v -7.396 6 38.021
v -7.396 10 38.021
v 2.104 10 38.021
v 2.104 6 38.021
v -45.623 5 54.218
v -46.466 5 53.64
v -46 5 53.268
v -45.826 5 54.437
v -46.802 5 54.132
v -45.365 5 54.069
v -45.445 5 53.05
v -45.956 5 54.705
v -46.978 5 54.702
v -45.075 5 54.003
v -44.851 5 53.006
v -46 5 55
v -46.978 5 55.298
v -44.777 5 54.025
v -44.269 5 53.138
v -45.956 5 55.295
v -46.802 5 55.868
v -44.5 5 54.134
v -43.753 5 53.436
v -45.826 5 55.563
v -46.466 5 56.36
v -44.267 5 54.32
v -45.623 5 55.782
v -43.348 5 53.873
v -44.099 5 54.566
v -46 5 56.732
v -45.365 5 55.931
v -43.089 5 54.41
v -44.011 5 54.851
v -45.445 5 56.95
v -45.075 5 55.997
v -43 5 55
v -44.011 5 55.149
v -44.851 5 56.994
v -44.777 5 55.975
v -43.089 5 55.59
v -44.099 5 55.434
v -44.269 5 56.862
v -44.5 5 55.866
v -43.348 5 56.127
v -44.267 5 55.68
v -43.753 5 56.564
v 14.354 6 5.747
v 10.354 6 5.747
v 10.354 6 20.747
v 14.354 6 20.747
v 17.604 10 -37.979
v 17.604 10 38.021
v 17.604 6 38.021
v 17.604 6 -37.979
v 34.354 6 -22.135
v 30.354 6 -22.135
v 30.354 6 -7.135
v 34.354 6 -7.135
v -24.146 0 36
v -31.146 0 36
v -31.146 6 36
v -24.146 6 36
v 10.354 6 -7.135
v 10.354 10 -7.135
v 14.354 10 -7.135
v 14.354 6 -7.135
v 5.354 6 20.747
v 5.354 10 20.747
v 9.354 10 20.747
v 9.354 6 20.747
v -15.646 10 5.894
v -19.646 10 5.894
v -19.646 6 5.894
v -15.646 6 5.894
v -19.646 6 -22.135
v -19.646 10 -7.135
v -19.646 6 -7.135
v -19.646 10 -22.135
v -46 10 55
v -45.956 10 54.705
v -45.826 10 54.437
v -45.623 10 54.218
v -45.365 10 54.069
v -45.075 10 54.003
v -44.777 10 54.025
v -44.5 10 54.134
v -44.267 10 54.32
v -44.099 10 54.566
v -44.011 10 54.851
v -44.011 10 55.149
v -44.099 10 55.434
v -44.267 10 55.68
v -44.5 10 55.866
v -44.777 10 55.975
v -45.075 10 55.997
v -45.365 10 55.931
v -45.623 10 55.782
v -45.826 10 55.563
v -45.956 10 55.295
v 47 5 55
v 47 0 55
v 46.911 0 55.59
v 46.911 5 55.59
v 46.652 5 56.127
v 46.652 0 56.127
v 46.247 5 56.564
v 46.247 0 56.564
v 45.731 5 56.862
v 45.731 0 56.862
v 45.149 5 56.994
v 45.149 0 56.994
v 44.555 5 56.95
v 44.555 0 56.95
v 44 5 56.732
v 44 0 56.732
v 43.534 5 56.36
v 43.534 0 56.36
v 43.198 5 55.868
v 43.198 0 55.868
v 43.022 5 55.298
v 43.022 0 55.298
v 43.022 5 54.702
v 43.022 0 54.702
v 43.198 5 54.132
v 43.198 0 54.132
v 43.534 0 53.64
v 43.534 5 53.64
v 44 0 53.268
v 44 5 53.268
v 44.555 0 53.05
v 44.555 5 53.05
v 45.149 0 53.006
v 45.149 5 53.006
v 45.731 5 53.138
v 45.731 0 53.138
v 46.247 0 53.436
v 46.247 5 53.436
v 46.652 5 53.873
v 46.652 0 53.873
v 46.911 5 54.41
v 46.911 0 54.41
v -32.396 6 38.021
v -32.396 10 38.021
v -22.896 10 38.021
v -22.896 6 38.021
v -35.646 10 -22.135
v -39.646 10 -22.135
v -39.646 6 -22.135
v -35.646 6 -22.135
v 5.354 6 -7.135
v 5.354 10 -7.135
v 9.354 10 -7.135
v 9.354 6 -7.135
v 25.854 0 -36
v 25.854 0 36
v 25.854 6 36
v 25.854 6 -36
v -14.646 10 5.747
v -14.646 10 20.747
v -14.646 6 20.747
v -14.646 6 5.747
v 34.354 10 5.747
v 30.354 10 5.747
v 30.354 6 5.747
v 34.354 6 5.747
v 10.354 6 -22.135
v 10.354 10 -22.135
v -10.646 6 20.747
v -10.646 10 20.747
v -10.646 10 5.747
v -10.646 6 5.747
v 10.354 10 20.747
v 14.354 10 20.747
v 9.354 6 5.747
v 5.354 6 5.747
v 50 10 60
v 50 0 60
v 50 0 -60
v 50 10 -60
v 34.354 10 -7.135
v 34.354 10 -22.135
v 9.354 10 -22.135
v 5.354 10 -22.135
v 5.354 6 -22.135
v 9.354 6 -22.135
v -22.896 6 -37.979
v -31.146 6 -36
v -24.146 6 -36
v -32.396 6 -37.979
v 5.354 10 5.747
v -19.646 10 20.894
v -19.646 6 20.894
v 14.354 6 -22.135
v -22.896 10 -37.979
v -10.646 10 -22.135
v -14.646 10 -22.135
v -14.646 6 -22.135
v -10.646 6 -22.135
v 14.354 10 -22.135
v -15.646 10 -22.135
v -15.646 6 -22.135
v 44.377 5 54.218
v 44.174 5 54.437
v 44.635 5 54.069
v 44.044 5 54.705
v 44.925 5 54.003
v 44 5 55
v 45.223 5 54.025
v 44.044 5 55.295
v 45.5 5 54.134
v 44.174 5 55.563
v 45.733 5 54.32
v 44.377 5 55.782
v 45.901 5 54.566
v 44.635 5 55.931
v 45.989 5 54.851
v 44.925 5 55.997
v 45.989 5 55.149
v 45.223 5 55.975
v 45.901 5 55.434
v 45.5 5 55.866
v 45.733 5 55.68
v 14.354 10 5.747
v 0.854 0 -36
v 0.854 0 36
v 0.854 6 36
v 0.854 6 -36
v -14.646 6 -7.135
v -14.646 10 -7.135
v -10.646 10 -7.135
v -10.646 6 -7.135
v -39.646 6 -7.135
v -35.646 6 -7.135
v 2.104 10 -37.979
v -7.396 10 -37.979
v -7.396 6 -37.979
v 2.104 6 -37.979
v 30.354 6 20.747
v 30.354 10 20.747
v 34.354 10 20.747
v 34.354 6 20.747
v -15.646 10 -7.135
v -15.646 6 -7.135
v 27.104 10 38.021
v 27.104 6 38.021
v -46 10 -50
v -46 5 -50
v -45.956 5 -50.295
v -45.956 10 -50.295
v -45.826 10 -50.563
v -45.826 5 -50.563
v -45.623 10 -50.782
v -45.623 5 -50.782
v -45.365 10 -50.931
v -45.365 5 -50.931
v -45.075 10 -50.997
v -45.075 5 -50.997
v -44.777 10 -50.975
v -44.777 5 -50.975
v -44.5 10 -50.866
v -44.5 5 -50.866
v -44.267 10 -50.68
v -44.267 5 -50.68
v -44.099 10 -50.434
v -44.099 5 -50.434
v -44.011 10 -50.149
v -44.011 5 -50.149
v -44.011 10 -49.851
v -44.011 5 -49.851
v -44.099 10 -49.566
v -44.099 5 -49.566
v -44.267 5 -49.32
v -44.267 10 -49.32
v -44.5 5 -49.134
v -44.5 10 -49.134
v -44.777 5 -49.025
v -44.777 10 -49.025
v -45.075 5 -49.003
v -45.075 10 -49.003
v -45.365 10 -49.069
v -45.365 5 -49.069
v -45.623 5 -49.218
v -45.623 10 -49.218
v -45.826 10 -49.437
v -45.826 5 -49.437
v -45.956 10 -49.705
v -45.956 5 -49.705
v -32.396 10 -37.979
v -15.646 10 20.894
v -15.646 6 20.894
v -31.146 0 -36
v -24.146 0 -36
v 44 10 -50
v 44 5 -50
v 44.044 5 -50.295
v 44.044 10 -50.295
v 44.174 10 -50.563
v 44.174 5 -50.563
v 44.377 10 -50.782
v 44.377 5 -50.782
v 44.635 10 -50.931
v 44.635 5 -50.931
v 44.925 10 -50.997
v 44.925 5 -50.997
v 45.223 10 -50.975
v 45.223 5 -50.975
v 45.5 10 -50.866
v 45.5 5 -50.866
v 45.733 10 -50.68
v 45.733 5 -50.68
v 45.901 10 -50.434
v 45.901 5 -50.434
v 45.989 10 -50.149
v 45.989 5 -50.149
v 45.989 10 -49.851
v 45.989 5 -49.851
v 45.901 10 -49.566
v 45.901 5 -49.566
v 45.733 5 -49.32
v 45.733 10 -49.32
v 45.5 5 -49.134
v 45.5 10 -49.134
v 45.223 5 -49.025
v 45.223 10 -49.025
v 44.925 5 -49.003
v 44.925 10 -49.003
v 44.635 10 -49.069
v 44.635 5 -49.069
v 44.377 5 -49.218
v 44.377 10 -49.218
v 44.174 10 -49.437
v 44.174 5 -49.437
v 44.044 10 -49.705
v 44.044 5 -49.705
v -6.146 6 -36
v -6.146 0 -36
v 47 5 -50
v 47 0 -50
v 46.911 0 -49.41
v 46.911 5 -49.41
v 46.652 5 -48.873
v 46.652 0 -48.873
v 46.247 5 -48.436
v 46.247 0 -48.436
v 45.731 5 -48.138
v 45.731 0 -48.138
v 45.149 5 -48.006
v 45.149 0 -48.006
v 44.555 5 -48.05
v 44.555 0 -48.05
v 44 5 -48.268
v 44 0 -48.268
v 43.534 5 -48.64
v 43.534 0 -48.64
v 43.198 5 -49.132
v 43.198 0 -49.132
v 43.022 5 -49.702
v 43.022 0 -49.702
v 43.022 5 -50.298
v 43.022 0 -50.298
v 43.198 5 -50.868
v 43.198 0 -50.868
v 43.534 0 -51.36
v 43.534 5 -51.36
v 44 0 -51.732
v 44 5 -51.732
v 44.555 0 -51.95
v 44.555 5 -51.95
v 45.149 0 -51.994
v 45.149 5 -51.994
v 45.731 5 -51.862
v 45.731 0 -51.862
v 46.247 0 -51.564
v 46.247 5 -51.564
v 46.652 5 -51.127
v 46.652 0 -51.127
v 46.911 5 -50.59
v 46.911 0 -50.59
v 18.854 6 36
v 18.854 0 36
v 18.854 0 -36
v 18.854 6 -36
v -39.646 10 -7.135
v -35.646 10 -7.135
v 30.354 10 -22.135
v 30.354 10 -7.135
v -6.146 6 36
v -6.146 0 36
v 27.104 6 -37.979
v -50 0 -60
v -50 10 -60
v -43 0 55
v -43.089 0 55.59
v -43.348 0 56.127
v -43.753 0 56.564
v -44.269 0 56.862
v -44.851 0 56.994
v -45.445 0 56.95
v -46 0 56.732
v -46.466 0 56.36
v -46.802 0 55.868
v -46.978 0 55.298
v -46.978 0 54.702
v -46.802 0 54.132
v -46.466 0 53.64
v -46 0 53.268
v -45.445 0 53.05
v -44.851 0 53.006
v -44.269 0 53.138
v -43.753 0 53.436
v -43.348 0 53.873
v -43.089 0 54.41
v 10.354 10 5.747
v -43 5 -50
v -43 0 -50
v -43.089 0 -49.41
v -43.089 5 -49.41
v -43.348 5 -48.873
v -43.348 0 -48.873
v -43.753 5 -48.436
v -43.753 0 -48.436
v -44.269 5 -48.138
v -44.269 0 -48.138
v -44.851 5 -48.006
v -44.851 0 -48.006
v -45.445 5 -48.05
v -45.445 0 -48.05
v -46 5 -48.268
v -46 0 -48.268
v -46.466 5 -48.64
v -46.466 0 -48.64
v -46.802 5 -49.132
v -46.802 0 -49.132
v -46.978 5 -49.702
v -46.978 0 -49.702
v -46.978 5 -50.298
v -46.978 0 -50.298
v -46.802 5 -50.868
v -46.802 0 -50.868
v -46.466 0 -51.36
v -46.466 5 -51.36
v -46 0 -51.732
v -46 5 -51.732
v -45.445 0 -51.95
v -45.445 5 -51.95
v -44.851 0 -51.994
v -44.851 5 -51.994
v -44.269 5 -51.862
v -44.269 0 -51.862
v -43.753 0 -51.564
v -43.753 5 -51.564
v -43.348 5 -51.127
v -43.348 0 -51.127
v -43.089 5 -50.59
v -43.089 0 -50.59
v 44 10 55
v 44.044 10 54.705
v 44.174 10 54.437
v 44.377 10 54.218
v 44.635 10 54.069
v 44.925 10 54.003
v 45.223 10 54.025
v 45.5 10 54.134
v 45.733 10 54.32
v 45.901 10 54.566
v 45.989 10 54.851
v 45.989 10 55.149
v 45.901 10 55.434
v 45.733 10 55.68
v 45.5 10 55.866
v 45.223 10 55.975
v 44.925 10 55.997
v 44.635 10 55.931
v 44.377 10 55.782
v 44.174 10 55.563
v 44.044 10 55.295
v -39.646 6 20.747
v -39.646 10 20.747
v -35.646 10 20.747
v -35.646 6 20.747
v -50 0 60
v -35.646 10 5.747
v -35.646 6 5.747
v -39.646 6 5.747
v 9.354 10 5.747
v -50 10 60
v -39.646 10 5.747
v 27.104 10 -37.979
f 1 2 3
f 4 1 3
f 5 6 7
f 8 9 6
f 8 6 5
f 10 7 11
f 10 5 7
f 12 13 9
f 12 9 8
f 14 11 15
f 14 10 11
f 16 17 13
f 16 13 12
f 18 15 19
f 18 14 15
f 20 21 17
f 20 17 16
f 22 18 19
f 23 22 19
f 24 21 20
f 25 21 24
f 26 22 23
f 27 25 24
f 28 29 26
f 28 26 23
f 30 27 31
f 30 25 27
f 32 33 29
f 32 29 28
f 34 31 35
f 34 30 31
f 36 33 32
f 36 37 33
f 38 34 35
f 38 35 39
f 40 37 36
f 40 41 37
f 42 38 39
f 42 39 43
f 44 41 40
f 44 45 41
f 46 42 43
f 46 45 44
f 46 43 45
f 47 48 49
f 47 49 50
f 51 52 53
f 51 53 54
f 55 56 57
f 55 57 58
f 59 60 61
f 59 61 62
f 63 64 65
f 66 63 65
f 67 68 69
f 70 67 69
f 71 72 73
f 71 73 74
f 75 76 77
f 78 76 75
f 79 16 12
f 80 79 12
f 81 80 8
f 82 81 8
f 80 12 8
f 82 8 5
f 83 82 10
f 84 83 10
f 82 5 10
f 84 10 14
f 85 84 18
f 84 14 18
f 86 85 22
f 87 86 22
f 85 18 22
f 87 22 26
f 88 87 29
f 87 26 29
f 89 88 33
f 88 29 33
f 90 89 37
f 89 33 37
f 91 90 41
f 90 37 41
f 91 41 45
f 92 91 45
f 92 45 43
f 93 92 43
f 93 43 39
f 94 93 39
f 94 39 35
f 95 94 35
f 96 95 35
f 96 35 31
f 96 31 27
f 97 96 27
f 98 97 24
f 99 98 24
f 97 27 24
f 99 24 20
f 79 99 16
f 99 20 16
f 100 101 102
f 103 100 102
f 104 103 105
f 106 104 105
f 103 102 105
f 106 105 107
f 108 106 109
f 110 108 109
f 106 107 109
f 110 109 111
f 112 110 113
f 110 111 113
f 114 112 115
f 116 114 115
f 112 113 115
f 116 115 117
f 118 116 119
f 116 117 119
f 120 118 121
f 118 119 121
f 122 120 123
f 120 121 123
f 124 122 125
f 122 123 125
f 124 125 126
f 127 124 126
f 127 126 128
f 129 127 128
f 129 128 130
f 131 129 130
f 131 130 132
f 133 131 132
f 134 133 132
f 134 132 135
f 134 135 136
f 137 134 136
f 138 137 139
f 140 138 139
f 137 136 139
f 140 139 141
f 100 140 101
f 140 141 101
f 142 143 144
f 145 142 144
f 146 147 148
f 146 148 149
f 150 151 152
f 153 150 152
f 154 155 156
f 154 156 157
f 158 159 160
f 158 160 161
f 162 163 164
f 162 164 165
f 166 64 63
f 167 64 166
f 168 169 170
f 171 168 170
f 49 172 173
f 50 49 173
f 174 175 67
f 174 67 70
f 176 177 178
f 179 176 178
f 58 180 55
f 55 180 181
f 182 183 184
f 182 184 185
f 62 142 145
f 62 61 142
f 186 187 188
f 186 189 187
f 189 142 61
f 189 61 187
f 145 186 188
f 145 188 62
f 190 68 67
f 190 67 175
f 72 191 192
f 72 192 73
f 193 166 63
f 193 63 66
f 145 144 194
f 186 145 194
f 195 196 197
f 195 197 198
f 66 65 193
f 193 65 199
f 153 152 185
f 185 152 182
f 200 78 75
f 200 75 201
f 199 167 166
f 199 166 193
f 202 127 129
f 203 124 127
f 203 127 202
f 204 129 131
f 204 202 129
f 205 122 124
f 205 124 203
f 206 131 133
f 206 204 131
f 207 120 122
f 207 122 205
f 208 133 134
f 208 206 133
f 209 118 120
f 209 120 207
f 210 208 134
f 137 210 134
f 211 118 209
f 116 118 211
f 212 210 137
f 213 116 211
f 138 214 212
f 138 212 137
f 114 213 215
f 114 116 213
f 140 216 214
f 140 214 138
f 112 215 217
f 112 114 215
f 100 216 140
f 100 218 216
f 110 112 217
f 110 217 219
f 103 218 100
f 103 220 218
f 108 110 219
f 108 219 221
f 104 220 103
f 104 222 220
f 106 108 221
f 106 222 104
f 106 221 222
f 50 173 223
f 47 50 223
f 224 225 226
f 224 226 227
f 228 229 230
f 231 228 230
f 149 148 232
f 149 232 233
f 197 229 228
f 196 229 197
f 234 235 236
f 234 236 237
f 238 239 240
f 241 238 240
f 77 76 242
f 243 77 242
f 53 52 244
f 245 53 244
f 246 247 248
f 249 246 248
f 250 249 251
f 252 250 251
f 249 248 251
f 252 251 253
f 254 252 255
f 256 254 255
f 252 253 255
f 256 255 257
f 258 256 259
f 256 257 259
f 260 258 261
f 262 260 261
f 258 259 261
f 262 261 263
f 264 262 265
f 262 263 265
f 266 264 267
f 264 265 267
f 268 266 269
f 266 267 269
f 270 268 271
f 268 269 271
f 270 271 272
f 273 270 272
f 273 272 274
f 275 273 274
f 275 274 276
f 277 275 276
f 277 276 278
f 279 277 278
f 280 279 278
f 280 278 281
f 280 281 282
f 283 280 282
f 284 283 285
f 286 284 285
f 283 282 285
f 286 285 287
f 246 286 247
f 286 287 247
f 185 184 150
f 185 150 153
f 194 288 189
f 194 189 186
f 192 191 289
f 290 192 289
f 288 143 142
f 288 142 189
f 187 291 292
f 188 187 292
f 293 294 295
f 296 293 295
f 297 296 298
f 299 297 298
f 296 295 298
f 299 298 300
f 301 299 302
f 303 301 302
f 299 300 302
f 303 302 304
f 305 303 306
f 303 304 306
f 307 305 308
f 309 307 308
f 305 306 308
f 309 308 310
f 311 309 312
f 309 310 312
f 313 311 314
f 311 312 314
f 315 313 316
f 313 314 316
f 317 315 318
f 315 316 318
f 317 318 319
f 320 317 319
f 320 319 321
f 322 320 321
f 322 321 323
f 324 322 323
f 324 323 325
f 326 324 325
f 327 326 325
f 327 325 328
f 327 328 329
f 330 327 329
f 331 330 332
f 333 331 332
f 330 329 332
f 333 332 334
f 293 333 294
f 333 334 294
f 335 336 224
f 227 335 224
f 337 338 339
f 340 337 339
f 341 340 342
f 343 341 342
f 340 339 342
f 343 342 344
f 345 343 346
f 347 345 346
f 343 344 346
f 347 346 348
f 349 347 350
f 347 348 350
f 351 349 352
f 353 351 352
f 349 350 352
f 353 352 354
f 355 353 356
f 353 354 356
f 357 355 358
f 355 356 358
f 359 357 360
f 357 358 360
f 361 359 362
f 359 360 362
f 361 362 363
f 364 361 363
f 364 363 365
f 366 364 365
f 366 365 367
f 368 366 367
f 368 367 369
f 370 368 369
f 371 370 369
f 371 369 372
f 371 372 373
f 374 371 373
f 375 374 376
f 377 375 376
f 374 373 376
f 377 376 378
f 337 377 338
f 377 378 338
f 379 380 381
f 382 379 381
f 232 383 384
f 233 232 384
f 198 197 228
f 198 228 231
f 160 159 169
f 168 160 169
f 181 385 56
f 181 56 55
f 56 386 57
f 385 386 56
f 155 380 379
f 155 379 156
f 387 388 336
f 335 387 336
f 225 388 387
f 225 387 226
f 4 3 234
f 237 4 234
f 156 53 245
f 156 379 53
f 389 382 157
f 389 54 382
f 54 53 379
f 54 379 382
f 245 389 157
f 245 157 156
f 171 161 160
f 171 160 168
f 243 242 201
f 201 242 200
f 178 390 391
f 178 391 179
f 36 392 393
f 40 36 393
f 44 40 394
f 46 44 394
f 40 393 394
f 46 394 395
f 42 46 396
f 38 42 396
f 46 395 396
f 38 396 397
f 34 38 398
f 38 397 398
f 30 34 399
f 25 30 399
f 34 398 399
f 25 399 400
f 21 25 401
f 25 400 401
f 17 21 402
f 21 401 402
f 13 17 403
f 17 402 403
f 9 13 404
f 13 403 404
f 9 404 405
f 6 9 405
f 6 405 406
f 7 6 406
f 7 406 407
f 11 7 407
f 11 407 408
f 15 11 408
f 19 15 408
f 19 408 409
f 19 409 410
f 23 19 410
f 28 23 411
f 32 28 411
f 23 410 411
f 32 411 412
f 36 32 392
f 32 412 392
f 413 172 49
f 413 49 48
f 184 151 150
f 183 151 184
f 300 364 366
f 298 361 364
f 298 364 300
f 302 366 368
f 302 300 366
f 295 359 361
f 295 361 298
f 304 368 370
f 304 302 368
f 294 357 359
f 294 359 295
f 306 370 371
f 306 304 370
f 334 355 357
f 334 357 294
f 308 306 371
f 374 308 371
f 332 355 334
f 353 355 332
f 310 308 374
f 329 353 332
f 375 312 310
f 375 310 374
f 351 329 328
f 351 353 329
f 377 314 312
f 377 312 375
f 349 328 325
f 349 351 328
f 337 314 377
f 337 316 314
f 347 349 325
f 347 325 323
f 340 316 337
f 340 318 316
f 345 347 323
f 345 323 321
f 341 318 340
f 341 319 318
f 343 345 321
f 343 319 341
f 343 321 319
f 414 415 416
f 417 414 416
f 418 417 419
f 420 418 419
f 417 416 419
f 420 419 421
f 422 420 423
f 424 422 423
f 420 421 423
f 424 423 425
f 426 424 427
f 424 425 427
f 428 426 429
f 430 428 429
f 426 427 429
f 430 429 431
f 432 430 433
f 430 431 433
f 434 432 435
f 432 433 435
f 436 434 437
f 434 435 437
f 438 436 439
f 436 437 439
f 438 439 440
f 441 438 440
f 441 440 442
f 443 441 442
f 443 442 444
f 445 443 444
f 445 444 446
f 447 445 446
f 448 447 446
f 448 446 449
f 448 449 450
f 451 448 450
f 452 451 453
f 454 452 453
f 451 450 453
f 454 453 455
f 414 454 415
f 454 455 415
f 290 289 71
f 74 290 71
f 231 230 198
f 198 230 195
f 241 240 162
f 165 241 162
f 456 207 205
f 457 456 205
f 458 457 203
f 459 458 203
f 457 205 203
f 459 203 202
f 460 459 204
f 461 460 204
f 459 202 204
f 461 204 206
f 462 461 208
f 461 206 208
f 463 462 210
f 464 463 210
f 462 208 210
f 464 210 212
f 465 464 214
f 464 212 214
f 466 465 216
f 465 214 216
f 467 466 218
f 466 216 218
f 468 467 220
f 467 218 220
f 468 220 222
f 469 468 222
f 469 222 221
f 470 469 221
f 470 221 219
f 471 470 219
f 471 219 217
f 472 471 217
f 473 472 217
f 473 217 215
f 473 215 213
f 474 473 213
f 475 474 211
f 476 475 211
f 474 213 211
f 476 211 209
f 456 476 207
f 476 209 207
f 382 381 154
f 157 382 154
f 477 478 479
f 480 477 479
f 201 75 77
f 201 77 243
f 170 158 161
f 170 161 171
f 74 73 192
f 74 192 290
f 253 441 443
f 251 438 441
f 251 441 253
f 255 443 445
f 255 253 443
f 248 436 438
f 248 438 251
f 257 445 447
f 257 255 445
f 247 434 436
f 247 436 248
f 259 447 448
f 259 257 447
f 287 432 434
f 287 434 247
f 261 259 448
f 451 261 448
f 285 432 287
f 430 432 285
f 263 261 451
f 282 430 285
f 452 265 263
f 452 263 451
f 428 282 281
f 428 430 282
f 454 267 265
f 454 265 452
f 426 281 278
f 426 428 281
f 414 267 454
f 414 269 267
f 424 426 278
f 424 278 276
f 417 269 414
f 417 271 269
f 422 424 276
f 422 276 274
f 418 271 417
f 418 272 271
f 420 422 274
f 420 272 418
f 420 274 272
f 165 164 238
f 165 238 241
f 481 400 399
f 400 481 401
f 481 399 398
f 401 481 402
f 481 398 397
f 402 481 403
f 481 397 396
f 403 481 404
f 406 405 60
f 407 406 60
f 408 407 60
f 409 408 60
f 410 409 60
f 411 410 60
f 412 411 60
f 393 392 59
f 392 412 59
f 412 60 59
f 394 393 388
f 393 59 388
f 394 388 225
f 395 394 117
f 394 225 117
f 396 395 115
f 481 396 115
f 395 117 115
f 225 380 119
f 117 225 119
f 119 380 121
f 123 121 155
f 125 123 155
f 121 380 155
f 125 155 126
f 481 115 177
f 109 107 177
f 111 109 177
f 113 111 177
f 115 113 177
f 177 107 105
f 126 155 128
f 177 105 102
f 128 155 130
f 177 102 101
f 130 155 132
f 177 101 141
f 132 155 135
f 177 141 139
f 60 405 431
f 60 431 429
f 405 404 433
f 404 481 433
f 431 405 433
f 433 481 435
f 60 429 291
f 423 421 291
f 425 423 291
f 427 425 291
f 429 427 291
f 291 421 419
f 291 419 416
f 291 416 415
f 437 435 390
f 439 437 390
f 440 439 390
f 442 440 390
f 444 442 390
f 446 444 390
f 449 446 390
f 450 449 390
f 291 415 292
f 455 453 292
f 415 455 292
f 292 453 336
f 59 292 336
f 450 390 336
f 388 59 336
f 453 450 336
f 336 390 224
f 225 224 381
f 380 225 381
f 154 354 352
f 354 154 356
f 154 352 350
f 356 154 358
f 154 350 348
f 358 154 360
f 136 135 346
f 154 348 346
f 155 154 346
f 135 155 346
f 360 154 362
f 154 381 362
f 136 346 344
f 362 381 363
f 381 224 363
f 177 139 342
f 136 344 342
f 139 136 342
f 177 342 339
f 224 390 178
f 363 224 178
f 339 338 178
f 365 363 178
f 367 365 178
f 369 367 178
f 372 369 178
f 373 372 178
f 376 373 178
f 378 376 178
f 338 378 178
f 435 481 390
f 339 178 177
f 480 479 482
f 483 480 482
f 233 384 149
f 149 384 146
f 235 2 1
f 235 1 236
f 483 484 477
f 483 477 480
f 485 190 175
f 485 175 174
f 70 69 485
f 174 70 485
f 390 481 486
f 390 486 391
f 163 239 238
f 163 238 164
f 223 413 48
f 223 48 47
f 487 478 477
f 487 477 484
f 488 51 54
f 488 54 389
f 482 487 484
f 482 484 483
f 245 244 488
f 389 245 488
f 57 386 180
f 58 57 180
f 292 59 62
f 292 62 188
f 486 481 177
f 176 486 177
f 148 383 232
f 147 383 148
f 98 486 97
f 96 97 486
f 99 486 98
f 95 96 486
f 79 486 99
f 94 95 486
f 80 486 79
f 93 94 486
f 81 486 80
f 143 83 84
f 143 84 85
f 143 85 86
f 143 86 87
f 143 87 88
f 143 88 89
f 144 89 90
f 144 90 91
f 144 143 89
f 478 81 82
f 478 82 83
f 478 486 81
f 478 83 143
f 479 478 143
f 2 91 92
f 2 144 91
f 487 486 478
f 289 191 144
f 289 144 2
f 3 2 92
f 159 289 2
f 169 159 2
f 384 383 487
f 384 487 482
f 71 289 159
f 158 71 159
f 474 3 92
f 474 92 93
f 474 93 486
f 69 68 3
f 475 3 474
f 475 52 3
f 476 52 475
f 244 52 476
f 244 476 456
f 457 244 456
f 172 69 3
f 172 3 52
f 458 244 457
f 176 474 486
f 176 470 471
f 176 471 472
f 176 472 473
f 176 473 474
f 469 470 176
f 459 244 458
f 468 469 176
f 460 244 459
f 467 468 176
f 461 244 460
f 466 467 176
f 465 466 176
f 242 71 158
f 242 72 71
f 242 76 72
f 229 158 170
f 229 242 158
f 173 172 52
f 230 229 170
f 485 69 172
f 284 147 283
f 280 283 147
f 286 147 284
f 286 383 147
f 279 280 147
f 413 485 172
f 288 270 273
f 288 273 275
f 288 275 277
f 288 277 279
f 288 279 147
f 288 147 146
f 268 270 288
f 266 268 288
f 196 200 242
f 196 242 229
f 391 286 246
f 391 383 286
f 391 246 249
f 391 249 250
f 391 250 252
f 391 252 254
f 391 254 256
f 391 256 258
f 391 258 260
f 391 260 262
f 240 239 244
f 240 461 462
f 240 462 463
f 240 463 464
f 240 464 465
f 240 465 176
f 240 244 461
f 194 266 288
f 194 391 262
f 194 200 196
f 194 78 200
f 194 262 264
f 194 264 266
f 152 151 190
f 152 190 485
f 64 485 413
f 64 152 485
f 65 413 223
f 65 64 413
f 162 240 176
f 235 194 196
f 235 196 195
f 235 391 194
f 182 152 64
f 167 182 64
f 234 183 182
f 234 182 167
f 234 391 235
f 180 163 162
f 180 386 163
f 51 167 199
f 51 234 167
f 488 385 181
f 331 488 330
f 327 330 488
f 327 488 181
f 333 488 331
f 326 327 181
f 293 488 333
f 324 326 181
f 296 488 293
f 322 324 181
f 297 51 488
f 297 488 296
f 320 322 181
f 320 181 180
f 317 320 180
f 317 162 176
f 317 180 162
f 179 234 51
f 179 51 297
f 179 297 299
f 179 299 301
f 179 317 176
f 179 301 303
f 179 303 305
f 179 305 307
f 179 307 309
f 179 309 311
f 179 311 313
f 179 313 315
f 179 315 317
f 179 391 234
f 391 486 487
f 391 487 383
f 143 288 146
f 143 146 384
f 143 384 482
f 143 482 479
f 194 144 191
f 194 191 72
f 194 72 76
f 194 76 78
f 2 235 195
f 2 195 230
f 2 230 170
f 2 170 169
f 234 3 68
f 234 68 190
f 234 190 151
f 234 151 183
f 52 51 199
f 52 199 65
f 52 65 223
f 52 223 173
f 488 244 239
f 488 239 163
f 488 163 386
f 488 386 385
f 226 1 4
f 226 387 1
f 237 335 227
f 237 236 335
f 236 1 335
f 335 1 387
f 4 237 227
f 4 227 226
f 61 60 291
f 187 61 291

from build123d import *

# Parameters (mm, degrees)
SKETCH2_W           = 100
SKETCH2_H           = 120
SKETCH2_W_2         = 7
SKETCH2_H_2         = 72
BOSS_EXTRUDE1_DEPTH = 10
SKETCH3_W           = 9.5
SKETCH3_H           = 76
SKETCH3_W_2         = 4
SKETCH3_H_2         = 15
CUT_EXTRUDE1_DEPTH  = 4
SKETCH7_R           = 2
CUT_EXTRUDE4_DEPTH  = 5
SKETCH8_R           = 1
CUT_EXTRUDE5_DEPTH  = 5


with BuildPart() as part:
    # Sketch2 → Boss-Extrude1 (new body)
    with BuildSketch(Plane(origin=(0, 0, 0), x_dir=(1, 0, 0), z_dir=(0, 1, 0))):
        Rectangle(SKETCH2_W, SKETCH2_H)
        with Locations((22.353747517, 0)):
            Rectangle(SKETCH2_W_2, SKETCH2_H_2, mode=Mode.SUBTRACT)
        with Locations((-2.646252483, 0)):
            Rectangle(SKETCH2_W_2, SKETCH2_H_2, mode=Mode.SUBTRACT)
        with Locations((-27.646252483, 0)):
            Rectangle(SKETCH2_W_2, SKETCH2_H_2, mode=Mode.SUBTRACT)
    extrude(amount=BOSS_EXTRUDE1_DEPTH)

    # Sketch3 → Cut-Extrude1 (cut)
    with BuildSketch(Plane(origin=(0, 10, 0), x_dir=(1, 0, 0), z_dir=(0, 1, 0))):
        with Locations((-2.646252483, -0.02091915)):
            Rectangle(SKETCH3_W, SKETCH3_H)
        with Locations((-17.646252483, -13.394152505)):
            Rectangle(SKETCH3_W_2, SKETCH3_H_2)
        with Locations((-17.646252483, 14.635235437)):
            Rectangle(SKETCH3_W_2, SKETCH3_H_2)
        with Locations((-37.646252483, 14.635235437)):
            Rectangle(SKETCH3_W_2, SKETCH3_H_2)
        with Locations((-37.646252483, -13.246569784)):
            Rectangle(SKETCH3_W_2, SKETCH3_H_2)
        with Locations((-12.646252483, -13.246569784)):
            Rectangle(SKETCH3_W_2, SKETCH3_H_2)
        with Locations((-12.646252483, 14.635235437)):
            Rectangle(SKETCH3_W_2, SKETCH3_H_2)
        with Locations((7.353747517, 14.635235437)):
            Rectangle(SKETCH3_W_2, SKETCH3_H_2)
        with Locations((12.353747517, 14.635235437)):
            Rectangle(SKETCH3_W_2, SKETCH3_H_2)
        with Locations((12.353747517, -13.246569784)):
            Rectangle(SKETCH3_W_2, SKETCH3_H_2)
        with Locations((7.353747517, -13.246569784)):
            Rectangle(SKETCH3_W_2, SKETCH3_H_2)
        with Locations((32.353747517, -13.246569784)):
            Rectangle(SKETCH3_W_2, SKETCH3_H_2)
        with Locations((32.353747517, 14.635235437)):
            Rectangle(SKETCH3_W_2, SKETCH3_H_2)
        with Locations((-27.646252483, -0.02091915)):
            Rectangle(SKETCH3_W, SKETCH3_H)
        with Locations((22.353747517, -0.02091915)):
            Rectangle(SKETCH3_W, SKETCH3_H)
    extrude(amount=-CUT_EXTRUDE1_DEPTH, mode=Mode.SUBTRACT)

    # Sketch7 → Cut-Extrude4 (cut)
    with BuildSketch(Plane.XZ):
        with Locations((45, -50)):
            Circle(SKETCH7_R)
        with Locations((-45, -50)):
            Circle(SKETCH7_R)
        with Locations((-45, 55)):
            Circle(SKETCH7_R)
        with Locations((45, 55)):
            Circle(SKETCH7_R)
    extrude(amount=-CUT_EXTRUDE4_DEPTH, mode=Mode.SUBTRACT)

    # Sketch8 → Cut-Extrude5 (cut)
    with BuildSketch(Plane(origin=(0, 5, 0), x_dir=(-1, 0, 0), z_dir=(0, -1, 0))):
        with Locations((-45, 50)):
            Circle(SKETCH8_R)
        with Locations((45, 50)):
            Circle(SKETCH8_R)
        with Locations((45, -55)):
            Circle(SKETCH8_R)
        with Locations((-45, -55)):
            Circle(SKETCH8_R)
    extrude(amount=-CUT_EXTRUDE5_DEPTH, mode=Mode.SUBTRACT)


solid = part.part
